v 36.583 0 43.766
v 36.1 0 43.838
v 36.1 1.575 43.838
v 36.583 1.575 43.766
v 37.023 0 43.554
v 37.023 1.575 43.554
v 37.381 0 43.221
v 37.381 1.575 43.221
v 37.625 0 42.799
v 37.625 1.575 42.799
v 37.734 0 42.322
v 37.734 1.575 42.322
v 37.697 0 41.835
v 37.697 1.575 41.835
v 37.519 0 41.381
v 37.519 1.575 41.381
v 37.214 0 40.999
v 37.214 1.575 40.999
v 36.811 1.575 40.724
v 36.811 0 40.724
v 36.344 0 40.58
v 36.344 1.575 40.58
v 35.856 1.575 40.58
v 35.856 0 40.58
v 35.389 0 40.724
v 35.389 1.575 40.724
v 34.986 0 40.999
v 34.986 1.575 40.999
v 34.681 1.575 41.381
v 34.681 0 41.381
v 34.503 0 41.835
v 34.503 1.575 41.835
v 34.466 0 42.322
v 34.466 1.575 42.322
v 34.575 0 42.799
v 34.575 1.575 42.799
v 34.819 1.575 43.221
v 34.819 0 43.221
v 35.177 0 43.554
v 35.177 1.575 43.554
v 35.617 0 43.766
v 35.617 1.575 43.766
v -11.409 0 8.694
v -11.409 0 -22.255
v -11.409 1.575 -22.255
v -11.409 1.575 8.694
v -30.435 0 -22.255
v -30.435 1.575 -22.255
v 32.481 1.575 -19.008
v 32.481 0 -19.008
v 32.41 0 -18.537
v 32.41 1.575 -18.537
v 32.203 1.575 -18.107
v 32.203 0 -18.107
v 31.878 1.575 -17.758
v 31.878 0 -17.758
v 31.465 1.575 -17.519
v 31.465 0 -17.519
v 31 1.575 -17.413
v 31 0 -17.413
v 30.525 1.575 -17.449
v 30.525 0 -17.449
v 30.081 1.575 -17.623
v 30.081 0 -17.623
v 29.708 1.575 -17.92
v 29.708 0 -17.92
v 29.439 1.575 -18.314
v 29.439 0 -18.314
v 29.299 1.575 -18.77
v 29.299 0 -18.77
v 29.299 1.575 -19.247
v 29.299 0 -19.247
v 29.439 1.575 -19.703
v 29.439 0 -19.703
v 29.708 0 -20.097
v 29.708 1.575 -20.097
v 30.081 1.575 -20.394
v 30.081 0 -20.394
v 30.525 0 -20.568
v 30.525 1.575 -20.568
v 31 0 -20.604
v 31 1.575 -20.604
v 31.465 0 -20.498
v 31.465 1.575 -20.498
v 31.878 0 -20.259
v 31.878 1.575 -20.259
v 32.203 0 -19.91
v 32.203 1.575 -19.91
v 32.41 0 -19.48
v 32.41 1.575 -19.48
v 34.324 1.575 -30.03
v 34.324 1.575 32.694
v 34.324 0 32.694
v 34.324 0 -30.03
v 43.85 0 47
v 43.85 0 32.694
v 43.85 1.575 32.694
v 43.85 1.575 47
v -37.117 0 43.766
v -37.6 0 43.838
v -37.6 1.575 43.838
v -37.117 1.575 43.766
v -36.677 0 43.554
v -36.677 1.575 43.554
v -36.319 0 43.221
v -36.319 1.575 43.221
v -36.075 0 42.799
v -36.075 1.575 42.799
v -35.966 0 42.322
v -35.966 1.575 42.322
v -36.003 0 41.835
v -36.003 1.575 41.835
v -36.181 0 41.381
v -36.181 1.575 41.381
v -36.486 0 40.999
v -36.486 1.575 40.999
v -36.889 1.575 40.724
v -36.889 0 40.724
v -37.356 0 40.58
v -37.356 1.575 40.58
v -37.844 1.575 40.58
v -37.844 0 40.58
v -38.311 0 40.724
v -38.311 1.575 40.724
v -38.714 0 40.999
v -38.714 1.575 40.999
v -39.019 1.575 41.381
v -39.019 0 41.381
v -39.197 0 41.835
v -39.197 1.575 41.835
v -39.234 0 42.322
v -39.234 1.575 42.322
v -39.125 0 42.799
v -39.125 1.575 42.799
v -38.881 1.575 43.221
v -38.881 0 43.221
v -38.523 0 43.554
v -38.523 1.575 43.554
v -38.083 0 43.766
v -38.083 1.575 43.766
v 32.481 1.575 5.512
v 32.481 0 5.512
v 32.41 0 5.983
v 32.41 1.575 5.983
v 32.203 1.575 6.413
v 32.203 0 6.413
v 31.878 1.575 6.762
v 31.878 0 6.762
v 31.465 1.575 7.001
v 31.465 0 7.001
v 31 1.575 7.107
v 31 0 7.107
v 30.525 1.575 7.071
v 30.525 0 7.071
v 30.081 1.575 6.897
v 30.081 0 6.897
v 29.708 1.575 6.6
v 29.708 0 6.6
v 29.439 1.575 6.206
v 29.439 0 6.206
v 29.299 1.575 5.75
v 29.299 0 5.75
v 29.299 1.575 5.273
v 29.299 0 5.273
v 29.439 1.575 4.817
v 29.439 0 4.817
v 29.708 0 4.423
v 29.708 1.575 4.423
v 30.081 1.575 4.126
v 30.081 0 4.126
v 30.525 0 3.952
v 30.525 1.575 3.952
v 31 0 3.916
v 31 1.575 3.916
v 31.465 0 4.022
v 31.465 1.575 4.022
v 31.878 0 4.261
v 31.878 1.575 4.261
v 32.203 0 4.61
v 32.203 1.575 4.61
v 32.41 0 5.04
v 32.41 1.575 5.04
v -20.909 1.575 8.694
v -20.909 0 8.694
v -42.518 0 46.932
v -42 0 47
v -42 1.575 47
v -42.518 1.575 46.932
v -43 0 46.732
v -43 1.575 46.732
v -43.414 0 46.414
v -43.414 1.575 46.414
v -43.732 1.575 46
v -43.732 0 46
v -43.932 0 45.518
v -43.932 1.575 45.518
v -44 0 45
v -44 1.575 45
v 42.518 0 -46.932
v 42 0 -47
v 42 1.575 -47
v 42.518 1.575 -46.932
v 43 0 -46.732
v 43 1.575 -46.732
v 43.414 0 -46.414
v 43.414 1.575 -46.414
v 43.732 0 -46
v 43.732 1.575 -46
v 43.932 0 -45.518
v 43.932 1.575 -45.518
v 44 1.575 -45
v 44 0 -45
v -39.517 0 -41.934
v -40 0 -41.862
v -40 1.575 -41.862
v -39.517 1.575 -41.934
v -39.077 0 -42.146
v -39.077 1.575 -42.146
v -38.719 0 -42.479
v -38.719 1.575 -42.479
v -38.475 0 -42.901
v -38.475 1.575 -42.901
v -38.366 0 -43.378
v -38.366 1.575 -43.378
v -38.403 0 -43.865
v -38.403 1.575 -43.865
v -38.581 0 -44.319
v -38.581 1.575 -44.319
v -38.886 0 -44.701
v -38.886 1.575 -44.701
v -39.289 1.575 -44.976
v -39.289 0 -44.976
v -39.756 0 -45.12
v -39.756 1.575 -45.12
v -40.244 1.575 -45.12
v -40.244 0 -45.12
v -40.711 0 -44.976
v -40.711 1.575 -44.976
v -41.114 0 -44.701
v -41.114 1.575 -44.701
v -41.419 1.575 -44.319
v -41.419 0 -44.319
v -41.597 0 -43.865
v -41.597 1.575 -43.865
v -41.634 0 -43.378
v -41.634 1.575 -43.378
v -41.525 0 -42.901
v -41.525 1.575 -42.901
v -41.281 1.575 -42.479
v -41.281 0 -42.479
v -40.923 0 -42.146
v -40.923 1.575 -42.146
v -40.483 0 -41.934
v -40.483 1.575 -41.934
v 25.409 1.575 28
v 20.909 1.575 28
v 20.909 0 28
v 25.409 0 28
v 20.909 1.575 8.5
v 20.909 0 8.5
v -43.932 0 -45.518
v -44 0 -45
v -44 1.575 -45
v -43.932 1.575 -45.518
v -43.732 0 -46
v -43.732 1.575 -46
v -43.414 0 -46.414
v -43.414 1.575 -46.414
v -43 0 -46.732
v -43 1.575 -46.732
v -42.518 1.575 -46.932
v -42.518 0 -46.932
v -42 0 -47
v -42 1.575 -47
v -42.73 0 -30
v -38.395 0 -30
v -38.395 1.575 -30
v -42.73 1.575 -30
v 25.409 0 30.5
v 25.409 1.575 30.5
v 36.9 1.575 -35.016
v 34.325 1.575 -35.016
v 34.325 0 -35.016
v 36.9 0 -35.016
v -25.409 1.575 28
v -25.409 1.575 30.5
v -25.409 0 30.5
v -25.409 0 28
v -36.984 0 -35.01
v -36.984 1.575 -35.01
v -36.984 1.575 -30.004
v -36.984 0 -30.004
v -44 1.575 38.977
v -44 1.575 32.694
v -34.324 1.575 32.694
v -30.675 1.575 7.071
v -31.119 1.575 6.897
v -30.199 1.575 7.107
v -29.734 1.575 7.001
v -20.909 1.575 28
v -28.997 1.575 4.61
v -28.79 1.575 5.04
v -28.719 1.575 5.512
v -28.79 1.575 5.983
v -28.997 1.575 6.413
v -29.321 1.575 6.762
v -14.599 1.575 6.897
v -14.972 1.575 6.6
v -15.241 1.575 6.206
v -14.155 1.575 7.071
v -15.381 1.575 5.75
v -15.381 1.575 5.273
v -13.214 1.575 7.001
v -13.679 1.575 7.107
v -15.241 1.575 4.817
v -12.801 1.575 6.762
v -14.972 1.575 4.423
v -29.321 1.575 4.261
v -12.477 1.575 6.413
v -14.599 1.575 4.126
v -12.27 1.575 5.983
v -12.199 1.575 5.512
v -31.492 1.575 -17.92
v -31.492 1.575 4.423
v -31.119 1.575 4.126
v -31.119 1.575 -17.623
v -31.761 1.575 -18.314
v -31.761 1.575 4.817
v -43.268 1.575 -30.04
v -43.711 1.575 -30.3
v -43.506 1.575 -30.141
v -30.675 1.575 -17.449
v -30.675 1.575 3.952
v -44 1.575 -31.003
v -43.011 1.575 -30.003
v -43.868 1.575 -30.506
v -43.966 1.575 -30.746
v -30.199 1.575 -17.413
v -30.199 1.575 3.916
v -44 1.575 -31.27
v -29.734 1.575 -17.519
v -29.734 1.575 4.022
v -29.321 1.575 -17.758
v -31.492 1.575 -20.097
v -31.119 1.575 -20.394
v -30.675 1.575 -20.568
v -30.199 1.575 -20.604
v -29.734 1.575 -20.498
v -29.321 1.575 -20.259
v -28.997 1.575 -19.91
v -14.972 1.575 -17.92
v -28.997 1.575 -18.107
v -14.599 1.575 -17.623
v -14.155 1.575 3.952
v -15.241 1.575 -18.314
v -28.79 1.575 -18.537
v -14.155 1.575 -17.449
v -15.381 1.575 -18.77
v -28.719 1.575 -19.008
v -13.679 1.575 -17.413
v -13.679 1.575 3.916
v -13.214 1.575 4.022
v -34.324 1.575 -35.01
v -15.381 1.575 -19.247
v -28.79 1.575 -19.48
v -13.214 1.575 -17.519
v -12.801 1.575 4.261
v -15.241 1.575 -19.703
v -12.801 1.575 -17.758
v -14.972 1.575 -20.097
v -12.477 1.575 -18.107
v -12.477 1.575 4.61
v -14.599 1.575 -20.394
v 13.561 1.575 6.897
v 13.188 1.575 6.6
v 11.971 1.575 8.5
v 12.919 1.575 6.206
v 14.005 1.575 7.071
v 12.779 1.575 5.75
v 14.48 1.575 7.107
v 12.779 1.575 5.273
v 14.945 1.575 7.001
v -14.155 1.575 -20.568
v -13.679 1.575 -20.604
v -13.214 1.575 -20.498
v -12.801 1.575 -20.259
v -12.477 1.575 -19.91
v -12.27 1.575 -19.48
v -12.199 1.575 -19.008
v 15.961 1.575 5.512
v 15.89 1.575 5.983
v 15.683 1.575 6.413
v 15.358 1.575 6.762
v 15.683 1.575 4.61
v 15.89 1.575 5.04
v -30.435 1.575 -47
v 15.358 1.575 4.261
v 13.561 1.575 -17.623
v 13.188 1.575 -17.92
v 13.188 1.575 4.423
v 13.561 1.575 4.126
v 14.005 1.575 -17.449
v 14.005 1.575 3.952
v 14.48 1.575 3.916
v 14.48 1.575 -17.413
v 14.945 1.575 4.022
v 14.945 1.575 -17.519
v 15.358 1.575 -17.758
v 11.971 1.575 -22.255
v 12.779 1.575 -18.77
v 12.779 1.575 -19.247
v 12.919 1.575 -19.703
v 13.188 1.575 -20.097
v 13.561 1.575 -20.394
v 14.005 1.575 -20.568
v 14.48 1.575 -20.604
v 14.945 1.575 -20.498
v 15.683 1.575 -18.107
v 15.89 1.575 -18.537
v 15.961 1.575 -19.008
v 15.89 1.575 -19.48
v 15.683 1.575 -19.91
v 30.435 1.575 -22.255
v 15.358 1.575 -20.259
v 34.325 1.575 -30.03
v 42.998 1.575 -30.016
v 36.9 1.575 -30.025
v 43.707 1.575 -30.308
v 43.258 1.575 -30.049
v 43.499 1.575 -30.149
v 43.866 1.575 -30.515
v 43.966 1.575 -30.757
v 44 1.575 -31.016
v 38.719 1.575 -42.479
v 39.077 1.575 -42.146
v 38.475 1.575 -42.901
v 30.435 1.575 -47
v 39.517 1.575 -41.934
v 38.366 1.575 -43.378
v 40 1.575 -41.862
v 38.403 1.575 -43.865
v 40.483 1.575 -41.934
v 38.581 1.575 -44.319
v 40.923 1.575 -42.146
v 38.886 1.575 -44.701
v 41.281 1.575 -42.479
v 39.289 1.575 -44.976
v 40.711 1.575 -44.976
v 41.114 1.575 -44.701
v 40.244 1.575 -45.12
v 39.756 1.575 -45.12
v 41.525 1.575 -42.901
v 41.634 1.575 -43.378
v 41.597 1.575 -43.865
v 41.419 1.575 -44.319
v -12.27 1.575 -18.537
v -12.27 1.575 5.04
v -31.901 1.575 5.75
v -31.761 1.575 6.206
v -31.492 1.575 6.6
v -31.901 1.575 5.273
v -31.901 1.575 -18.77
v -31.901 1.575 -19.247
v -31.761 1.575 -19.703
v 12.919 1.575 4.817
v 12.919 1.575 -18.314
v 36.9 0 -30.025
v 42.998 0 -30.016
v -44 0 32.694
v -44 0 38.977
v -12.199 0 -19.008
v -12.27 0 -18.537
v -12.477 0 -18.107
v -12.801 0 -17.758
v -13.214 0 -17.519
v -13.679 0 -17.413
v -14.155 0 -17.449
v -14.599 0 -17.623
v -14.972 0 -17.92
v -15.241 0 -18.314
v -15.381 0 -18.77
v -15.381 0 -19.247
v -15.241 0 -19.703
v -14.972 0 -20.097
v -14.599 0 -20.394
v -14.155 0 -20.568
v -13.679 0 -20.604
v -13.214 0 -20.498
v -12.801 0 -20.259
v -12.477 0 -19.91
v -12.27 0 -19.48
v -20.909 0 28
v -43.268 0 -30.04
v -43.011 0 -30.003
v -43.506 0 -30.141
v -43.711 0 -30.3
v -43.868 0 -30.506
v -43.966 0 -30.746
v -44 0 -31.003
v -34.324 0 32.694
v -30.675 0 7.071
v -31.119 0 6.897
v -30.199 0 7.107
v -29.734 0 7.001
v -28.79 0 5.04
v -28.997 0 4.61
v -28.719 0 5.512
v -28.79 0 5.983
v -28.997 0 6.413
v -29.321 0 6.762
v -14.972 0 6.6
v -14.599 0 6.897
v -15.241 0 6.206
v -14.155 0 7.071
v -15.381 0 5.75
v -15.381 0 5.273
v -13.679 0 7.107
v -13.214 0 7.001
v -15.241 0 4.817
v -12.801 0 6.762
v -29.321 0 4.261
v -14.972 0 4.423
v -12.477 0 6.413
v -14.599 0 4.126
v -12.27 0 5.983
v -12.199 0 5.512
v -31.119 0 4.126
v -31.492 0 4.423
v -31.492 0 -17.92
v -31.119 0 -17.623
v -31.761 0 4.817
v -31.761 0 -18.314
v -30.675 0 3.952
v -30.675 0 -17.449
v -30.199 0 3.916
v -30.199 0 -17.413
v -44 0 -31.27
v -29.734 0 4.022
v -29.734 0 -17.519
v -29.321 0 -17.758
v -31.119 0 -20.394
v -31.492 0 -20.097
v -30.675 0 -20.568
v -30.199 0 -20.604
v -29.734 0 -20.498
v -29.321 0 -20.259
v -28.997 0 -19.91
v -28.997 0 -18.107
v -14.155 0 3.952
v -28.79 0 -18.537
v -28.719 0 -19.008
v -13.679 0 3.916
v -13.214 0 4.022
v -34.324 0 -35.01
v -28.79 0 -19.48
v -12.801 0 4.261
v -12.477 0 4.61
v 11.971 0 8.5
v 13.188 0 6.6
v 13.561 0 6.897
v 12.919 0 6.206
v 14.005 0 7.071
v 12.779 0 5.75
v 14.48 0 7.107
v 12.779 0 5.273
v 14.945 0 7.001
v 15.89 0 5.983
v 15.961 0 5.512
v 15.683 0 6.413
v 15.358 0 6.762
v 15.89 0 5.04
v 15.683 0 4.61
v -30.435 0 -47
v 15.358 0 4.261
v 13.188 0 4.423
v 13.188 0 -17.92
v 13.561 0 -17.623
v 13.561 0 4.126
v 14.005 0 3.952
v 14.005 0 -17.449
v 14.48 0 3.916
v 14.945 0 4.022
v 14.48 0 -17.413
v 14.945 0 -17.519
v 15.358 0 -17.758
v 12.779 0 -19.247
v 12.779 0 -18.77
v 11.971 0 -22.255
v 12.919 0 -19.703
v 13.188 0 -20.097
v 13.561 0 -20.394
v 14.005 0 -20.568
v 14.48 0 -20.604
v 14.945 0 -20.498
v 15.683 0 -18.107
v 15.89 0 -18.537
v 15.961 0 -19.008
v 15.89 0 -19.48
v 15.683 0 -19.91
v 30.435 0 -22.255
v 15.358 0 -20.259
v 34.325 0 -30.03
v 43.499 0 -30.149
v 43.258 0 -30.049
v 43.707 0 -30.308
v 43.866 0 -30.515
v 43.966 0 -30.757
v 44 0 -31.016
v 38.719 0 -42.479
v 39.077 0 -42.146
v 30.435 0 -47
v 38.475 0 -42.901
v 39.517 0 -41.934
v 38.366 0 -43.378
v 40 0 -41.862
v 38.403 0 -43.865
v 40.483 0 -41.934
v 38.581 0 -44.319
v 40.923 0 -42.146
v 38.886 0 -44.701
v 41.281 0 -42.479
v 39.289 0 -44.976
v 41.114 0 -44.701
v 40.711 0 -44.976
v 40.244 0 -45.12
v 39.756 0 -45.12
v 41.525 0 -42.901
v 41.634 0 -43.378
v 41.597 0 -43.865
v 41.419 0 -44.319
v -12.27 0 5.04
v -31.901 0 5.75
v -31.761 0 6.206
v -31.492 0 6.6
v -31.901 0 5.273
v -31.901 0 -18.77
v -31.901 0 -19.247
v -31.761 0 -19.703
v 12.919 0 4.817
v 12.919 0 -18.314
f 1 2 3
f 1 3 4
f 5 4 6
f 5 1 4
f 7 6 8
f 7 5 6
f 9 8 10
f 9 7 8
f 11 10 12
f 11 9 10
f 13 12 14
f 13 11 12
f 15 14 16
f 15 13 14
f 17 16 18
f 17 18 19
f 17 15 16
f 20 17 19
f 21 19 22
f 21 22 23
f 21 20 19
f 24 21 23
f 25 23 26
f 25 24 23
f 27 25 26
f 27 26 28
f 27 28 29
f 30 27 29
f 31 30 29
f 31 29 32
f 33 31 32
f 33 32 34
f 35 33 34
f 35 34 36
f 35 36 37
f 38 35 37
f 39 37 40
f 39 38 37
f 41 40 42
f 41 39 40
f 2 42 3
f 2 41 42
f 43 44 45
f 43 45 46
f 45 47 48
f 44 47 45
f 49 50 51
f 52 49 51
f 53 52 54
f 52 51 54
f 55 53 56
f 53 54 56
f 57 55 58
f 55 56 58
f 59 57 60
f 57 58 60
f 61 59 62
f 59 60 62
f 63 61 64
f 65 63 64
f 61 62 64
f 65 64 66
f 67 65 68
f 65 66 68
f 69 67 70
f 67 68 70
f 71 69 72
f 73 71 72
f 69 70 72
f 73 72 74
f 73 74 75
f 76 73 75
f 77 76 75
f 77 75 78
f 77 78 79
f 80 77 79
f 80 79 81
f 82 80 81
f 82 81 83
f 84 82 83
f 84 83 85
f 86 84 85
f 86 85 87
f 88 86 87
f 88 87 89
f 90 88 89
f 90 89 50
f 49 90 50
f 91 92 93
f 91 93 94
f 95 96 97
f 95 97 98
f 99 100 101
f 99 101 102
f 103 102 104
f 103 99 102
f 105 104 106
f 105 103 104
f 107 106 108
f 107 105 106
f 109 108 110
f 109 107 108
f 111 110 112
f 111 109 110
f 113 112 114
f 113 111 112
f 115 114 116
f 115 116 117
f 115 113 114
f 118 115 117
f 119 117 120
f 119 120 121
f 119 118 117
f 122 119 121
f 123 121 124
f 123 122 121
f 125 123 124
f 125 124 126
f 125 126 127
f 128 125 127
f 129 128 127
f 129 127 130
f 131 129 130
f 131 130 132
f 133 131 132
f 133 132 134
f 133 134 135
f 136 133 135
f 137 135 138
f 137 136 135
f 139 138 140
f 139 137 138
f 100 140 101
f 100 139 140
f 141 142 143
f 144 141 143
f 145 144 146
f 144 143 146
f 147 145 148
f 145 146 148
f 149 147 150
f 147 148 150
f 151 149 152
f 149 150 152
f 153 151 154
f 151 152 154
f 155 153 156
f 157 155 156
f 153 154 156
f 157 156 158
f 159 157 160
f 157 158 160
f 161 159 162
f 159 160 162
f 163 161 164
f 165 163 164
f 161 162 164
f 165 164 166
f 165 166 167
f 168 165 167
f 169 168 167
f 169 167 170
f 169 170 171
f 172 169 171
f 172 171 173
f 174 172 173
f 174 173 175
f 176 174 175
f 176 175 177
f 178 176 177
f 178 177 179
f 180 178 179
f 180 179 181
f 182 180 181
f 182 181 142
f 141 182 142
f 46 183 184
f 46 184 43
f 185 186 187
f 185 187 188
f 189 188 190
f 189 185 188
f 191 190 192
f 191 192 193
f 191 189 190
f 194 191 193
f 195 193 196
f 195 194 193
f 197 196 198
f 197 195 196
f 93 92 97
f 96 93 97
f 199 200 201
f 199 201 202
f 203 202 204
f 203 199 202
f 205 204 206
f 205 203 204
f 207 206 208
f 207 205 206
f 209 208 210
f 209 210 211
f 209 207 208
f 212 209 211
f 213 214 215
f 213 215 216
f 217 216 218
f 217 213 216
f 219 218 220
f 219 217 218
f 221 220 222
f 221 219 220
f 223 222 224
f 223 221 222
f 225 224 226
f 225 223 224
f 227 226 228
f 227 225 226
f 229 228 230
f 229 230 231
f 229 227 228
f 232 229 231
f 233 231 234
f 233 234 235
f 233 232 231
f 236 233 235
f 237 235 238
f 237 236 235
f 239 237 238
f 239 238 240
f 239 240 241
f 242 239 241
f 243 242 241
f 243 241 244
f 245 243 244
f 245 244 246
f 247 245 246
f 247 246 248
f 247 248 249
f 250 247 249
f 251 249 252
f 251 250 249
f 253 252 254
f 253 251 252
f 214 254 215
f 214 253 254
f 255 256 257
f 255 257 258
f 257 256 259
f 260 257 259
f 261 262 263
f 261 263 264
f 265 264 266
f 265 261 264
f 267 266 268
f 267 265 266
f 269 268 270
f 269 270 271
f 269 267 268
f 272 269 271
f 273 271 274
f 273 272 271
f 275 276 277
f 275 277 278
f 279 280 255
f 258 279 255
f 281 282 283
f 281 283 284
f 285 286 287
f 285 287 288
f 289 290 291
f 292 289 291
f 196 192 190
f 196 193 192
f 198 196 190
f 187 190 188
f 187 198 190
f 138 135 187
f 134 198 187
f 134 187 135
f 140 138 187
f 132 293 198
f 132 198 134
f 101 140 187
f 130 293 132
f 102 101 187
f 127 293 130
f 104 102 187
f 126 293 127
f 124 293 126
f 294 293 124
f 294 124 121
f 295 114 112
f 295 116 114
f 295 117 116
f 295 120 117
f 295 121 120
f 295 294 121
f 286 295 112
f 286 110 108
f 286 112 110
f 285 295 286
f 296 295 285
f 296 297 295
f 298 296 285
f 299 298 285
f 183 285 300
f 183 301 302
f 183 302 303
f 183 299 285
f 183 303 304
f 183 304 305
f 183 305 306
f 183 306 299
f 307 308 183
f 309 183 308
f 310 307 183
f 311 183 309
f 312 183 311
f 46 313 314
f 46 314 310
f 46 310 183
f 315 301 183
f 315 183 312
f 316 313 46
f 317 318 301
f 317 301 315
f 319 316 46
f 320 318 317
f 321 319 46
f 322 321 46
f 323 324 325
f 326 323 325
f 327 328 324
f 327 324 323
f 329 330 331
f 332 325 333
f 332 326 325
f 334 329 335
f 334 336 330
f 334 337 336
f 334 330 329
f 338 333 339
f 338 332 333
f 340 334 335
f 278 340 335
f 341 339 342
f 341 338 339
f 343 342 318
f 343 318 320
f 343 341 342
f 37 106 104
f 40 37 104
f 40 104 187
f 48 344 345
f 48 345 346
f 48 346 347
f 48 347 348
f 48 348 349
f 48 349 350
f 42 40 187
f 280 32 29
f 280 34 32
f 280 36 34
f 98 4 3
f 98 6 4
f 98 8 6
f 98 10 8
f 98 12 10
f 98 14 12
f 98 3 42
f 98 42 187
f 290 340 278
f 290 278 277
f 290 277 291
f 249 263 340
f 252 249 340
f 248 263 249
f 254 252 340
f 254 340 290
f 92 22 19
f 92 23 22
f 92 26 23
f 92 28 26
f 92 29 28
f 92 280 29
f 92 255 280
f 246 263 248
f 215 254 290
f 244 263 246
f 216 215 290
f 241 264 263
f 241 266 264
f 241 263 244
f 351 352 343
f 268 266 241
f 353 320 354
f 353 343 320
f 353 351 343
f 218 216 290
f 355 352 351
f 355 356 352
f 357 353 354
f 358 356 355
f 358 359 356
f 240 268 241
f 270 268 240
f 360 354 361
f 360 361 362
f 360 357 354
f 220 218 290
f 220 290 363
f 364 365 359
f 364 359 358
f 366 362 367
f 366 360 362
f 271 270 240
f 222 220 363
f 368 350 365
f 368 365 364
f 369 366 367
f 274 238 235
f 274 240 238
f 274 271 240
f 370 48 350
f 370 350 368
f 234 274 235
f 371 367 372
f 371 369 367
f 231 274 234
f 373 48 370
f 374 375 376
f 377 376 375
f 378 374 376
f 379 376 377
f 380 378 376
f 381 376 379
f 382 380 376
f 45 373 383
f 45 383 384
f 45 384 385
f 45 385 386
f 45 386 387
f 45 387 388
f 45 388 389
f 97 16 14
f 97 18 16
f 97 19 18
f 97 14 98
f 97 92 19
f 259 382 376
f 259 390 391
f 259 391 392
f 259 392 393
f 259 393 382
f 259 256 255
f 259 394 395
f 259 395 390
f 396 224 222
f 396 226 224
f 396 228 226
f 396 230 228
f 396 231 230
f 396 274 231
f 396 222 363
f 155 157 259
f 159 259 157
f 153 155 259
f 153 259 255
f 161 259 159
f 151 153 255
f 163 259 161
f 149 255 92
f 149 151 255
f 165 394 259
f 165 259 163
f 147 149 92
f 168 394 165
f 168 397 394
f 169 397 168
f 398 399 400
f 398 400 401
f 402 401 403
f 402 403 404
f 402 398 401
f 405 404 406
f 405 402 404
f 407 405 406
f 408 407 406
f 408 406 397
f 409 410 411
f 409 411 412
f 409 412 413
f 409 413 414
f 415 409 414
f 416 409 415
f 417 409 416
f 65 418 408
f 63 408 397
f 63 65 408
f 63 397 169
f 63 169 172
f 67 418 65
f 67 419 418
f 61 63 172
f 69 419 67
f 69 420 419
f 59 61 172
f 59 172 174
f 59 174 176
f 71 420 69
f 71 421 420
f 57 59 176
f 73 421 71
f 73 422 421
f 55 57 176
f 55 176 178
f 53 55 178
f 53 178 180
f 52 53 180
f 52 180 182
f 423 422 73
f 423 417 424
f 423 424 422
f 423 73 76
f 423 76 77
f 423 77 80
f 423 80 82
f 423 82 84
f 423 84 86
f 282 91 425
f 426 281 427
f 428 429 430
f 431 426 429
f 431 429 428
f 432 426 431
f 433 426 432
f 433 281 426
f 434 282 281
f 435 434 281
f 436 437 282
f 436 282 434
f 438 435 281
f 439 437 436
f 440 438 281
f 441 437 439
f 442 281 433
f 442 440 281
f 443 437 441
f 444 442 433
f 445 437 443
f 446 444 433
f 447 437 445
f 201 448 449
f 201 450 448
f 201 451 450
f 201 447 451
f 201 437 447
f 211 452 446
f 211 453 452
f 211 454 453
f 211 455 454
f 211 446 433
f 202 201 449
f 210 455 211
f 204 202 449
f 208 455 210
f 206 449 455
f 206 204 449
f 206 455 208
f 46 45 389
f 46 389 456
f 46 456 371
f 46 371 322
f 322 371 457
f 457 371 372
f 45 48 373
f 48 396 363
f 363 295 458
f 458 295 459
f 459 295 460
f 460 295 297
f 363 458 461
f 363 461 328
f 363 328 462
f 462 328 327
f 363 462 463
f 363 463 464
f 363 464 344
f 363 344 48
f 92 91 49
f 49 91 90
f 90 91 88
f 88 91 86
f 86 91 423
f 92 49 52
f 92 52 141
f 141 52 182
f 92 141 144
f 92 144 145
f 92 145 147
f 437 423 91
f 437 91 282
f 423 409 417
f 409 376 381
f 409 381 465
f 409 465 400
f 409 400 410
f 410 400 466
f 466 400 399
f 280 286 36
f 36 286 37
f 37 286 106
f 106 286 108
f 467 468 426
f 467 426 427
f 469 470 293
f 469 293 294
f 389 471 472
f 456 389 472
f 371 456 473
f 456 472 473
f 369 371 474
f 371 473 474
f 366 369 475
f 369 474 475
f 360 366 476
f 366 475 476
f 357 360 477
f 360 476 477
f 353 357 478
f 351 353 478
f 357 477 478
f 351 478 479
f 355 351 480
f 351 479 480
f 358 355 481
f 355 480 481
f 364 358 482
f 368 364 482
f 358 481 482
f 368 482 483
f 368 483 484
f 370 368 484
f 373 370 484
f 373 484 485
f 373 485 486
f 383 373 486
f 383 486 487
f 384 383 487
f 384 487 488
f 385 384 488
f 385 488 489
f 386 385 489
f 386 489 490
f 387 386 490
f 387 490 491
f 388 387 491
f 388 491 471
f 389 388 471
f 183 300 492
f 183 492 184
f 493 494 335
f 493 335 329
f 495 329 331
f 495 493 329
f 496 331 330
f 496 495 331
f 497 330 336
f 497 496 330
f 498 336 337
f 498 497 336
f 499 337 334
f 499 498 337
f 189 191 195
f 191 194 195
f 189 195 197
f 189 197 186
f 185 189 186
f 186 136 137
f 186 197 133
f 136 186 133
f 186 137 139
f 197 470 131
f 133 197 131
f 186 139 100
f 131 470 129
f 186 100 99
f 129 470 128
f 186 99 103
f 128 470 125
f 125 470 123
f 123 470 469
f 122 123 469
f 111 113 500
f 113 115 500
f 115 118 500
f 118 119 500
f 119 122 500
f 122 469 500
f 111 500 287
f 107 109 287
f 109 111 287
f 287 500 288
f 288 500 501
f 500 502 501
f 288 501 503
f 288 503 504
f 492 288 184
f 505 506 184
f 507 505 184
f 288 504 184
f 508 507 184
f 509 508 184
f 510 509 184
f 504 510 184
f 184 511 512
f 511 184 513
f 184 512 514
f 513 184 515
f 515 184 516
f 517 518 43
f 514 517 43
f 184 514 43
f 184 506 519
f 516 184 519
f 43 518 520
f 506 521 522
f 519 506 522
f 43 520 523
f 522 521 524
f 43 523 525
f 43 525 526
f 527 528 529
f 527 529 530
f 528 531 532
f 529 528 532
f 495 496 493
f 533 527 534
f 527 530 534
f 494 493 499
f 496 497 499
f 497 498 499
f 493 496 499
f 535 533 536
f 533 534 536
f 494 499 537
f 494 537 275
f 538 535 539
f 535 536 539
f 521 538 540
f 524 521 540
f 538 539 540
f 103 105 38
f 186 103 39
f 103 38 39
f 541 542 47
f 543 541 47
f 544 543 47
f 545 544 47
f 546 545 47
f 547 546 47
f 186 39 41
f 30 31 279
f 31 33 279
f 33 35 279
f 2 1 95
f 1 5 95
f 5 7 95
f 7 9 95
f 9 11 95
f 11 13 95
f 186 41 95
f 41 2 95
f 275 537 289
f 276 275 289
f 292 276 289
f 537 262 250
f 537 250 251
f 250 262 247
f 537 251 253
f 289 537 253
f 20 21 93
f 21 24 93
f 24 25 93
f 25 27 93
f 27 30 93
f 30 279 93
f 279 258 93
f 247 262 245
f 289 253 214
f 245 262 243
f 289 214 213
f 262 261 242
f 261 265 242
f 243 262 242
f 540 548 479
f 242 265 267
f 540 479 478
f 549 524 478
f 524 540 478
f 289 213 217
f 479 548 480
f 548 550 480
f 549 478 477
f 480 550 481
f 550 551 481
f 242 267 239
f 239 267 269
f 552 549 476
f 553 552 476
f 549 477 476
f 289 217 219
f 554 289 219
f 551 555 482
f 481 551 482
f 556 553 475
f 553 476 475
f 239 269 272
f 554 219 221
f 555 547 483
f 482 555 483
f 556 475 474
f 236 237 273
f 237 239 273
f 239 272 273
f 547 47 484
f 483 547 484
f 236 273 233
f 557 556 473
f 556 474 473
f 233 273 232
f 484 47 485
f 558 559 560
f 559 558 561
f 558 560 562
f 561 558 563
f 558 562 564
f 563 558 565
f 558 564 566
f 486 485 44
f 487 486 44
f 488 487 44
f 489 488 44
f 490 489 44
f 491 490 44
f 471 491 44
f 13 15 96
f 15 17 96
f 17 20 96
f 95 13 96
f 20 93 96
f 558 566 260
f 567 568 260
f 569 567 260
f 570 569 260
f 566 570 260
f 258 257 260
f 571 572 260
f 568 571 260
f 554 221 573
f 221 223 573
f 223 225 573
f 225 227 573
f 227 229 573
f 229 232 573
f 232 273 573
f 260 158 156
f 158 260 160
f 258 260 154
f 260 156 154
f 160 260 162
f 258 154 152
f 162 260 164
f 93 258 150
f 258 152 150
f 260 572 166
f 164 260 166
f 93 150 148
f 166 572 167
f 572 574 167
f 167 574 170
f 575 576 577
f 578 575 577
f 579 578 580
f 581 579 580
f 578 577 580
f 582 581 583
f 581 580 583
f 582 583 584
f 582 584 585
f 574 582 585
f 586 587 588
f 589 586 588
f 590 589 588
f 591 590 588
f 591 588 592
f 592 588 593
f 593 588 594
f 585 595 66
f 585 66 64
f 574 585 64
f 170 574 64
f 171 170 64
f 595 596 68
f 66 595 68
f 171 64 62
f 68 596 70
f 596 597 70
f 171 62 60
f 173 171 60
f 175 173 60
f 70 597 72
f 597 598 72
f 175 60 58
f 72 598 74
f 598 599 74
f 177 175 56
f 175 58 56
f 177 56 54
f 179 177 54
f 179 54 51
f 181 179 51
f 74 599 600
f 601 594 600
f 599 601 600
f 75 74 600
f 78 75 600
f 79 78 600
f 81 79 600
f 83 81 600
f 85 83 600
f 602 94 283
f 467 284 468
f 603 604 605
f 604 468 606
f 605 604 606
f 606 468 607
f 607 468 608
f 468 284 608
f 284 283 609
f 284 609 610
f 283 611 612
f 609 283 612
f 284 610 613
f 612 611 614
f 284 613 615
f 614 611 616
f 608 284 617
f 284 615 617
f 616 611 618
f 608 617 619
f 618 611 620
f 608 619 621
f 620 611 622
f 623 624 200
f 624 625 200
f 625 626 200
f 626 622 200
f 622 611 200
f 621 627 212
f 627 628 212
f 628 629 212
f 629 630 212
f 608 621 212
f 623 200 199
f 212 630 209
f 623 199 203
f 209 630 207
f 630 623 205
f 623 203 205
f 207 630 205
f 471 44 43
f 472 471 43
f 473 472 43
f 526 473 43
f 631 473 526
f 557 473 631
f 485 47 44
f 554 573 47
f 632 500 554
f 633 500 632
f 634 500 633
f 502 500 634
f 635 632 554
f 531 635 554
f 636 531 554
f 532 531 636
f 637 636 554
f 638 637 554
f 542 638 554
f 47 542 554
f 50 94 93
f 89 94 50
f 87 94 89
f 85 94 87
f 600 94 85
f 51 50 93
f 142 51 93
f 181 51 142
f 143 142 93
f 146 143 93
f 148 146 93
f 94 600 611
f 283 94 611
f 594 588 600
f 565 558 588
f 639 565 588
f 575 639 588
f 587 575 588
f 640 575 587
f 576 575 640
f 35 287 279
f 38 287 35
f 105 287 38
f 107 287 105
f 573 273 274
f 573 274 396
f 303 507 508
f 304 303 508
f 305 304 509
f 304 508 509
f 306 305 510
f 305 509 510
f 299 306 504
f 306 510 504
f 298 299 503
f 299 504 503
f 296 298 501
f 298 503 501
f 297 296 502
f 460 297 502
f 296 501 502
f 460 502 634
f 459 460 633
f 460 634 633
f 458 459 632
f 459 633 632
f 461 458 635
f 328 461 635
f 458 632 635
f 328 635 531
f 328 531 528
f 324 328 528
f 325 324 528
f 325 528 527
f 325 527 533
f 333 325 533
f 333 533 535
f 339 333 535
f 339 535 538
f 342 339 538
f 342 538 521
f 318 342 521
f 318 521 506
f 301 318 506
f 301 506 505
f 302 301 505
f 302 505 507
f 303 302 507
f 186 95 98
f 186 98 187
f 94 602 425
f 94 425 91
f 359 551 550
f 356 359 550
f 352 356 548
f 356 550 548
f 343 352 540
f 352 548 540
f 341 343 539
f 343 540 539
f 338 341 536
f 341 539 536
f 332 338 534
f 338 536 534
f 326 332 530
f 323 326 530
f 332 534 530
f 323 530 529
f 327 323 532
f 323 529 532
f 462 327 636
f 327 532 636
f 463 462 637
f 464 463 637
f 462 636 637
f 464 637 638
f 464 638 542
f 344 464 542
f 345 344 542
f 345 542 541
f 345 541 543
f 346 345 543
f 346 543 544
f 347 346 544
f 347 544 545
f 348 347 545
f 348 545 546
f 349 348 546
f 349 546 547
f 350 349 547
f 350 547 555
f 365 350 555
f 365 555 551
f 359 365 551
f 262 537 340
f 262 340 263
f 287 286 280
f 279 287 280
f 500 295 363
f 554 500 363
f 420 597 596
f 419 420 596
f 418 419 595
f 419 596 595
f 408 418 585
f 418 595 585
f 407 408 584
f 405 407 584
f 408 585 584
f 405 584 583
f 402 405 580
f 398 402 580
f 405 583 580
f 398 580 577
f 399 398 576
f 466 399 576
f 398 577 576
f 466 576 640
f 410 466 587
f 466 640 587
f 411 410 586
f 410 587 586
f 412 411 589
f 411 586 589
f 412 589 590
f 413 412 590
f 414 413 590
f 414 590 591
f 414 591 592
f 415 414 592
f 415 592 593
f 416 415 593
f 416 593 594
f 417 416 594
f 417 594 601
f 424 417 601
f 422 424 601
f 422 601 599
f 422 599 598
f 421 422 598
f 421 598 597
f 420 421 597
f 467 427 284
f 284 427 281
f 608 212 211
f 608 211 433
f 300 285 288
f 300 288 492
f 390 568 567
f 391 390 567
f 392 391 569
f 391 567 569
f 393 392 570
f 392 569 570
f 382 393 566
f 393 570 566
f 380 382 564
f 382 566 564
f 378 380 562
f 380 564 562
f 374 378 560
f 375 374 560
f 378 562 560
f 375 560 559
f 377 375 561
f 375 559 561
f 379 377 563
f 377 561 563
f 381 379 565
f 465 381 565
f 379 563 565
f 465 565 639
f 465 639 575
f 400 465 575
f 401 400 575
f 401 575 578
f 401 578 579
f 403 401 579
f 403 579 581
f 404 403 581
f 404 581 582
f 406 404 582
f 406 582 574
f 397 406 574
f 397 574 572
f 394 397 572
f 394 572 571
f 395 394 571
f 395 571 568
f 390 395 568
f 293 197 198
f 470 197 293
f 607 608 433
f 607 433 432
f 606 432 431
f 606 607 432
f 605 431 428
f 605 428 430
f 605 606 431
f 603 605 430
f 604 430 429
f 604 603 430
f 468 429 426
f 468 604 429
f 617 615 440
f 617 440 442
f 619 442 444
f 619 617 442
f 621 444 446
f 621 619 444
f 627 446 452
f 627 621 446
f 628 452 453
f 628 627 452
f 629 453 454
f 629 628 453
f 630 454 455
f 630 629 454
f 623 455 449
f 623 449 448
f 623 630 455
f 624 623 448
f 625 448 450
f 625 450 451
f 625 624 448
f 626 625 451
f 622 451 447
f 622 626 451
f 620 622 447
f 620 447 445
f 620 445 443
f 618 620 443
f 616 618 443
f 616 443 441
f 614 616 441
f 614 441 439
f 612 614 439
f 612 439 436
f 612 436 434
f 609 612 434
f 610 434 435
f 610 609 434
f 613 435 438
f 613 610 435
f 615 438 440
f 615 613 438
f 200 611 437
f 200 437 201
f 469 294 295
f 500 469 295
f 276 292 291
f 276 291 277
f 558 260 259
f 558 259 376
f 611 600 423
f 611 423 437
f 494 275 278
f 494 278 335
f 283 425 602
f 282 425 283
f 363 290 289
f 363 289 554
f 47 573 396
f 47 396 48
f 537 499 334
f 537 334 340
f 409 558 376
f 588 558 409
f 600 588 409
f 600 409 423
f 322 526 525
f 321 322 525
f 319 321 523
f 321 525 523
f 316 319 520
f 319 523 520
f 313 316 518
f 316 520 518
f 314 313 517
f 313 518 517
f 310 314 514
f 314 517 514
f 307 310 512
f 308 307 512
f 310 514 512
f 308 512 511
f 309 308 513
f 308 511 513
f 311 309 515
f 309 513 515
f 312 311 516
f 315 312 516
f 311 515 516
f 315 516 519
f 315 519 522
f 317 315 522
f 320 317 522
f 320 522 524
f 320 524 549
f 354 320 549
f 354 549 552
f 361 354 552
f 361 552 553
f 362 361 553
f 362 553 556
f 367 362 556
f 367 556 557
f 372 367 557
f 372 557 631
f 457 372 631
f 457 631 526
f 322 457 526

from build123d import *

# Parameters (mm, degrees)
SKETCH1_2_R                 = 1.6383
BOSS_EXTRUDE2_DEPTH         = 1.575
SKETCH2_W                   = 14.080651801
SKETCH2_H                   = 7.11628052
SKETCH2_W_2                 = 15.007196354
SKETCH2_H_2                 = 9.421332762
CUT_EXTRUDE1_DEPTH          = 65.400942629
ADDITIONAL_PCB_MATERIAL_W   = 2.649520344
ADDITIONAL_PCB_MATERIAL_H   = 65.213315835
ADDITIONAL_PCB_MATERIAL_W_2 = 1.5
ADDITIONAL_PCB_MATERIAL_H_2 = 65.299191064
BOSS_EXTRUDE3_DEPTH         = 1.575
SKETCH3_W                   = 46.818
SKETCH3_H                   = 1
BOSS_EXTRUDE4_DEPTH         = 1.575
SKETCH4_W                   = 2
SKETCH4_H                   = 2.5
CUT_EXTRUDE2_DEPTH          = 65.400942629
SKETCH5_W                   = 2.5
SKETCH5_H                   = 18.09999695
SKETCH5_H_2                 = 19.499999394
BOSS_EXTRUDE5_DEPTH         = 1.575
SKETCH7_W                   = 9.5
SKETCH7_H                   = 1.20600305
CUT_EXTRUDE3_DEPTH          = 65.400942629
M3_CLEARANCE_HOLE1_D        = 3.2
M3_CLEARANCE_HOLE2_D        = 3.2
M3_CLEARANCE_HOLE3_D        = 3.2
M3_CLEARANCE_HOLE4_D        = 3.2
M3_CLEARANCE_HOLE5_D        = 3.2
SKETCH26_W                  = 2.575
SKETCH26_H                  = 5
CUT_EXTRUDE4_DEPTH          = 10


with BuildPart() as part:
    # Sketch1<2> → Boss-Extrude2 (new body)
    with BuildSketch(Plane(origin=(0, 0, 0), x_dir=(1, 0, 0), z_dir=(0, 1, 0))):
        with BuildLine():
            Line((-38.39500299, 29.999999735), (-42.73000299, 29.999999735))
            Line((-42.73000299, 29.999999735), (-43.011025994, 30.003097626))
            ThreePointArc((-43.011025994, 30.003097626), (-43.710996344, 30.299838092), (-44.000003042, 31.003036872))
            Line((-44.000003042, 31.003036872), (-44.000003042, 31.269999735))
            Line((-44.000003042, 31.269999735), (-44.000005679, 44.999999735))
            ThreePointArc((-44.000005679, 44.999999735), (-43.414218633, 46.414215608), (-42.000002924, 47.000003051))
            Line((-42.000002924, 47.000003051), (-30.435003, 47.000003051))
            Line((-30.435003, 47.000003051), (-30.435003, 22.255357341))
            Line((-30.435003, 22.255357341), (-11.409003, 22.255357341))
            Line((-11.409003, 22.255357341), (-11.409003, -9.899999999))
            Line((-11.409003, -9.899999999), (-23.409003, -9.899999999))
            Line((-23.409003, -9.899999999), (-23.409003, -31.499996949))
            Line((-23.409003, -31.499996949), (23.408997, -31.499996949))
            Line((23.408997, -31.499996949), (23.408997, -8.499997555))
            Line((23.408997, -8.499997555), (11.97084713, -8.499997555))
            Line((11.97084713, -8.499997555), (11.97084713, 22.255357341))
            Line((11.97084713, 22.255357341), (30.434997, 22.255357341))
            Line((30.434997, 22.255357341), (30.434997, 47.000003051))
            Line((30.434997, 47.000003051), (42.000008541, 47.000003051))
            ThreePointArc((42.000008541, 47.000003051), (43.414213215, 46.414220704), (43.999996956, 45.000016607))
            Line((43.999996956, 45.000016607), (43.999996956, 32.000003378))
            Line((43.999996956, 32.000003378), (43.999996956, 31.015615364))
            ThreePointArc((43.999996956, 31.015615364), (43.706534093, 30.307939396), (42.998386406, 30.015616661))
            Line((42.998386406, 30.015616661), (33.825607551, 30.030389905))
            ThreePointArc((33.825607551, 30.030389905), (33.117459864, 29.738067169), (32.823997, 29.030391202))
            Line((32.823997, 29.030391202), (32.823997, -30.453996949))
            ThreePointArc((32.823997, -30.453996949), (33.116890219, -31.16110373), (33.823997, -31.453996949))
            Line((33.823997, -31.453996949), (36.099999555, -31.453996949))
            Line((36.099999555, -31.453996949), (42.849728118, -31.453996949))
            ThreePointArc((42.849728118, -31.453996949), (43.556834899, -31.746890168), (43.849728118, -32.453996949))
            Line((43.849728118, -32.453996949), (43.849728118, -36.999996949))
            Line((43.849728118, -36.999996949), (43.849728118, -46.999996949))
            Line((43.849728118, -46.999996949), (-42.000000178, -46.999996949))
            ThreePointArc((-42.000000178, -46.999996949), (-43.414212804, -46.414211581), (-44.000000499, -44.999999921))
            Line((-44.000000499, -44.999999921), (-44.000000178, -38.976999921))
            Line((-44.000000178, -38.976999921), (-44.000000178, -32.453999802))
            ThreePointArc((-44.000000178, -32.453999802), (-43.70710696, -31.746893021), (-43.000000178, -31.453999802))
            Line((-43.000000178, -31.453999802), (-36.100000549, -31.453999802))
            Line((-36.100000549, -31.453999802), (-33.824003042, -31.453999802))
            ThreePointArc((-33.824003042, -31.453999802), (-33.116896261, -31.161106583), (-32.824003042, -30.453999802))
            Line((-32.824003042, -30.453999802), (-32.824003042, 29.011483943))
            ThreePointArc((-32.824003042, 29.011483943), (-33.117785331, 29.719478678), (-33.826516131, 30.011480785))
            Line((-33.826516131, 30.011480785), (-38.39500299, 29.999999735))
        make_face()
        with Locations((40, 43.5)):
            Circle(SKETCH1_2_R, mode=Mode.SUBTRACT)
        with Locations((-40, 43.5)):
            Circle(SKETCH1_2_R, mode=Mode.SUBTRACT)
        with Locations((-37.6, -42.2)):
            Circle(SKETCH1_2_R, mode=Mode.SUBTRACT)
        with Locations((36.1, -42.2)):
            Circle(SKETCH1_2_R, mode=Mode.SUBTRACT)
    extrude(amount=BOSS_EXTRUDE2_DEPTH)

    # Sketch2 → Cut-Extrude1 (cut, through all)
    with BuildSketch(Plane(origin=(0, 1.575, 0), x_dir=(1, 0, 0), z_dir=(0, 1, 0))):
        with Locations((39.863054019, -29.135856689)):
            Rectangle(SKETCH2_W, SKETCH2_H)
        with Locations((-40.336598676, -27.983330568)):
            Rectangle(SKETCH2_W_2, SKETCH2_H_2)
    extrude(amount=-CUT_EXTRUDE1_DEPTH, mode=Mode.SUBTRACT)

    # Additional PCB material → Boss-Extrude3 (add)
    with BuildSketch(Plane(origin=(0, 1.575, 0), x_dir=(1, 0, 0), z_dir=(0, 1, 0))):
        with Locations((32.999236828, -1.128517583)):
            Rectangle(ADDITIONAL_PCB_MATERIAL_W, ADDITIONAL_PCB_MATERIAL_H)
        with Locations((-33.574003042, -1.085579968)):
            Rectangle(ADDITIONAL_PCB_MATERIAL_W_2, ADDITIONAL_PCB_MATERIAL_H_2)
    extrude(amount=-BOSS_EXTRUDE3_DEPTH)

    # Sketch3 → Boss-Extrude4 (add)
    with BuildSketch(Plane(origin=(0, 1.575, 0), x_dir=(1, 0, 0), z_dir=(0, 1, 0))):
        with Locations((-3e-06, -30.999996949)):
            Rectangle(SKETCH3_W, SKETCH3_H)
    extrude(amount=-BOSS_EXTRUDE4_DEPTH)

    # Sketch4 → Cut-Extrude2 (cut, through all)
    with BuildSketch(Plane(origin=(0, 1.575, 0), x_dir=(1, 0, 0), z_dir=(0, 1, 0))):
        with Locations((24.408997, -29.249996949)):
            Rectangle(SKETCH4_W, SKETCH4_H)
        with Locations((-24.409003, -29.249996949)):
            Rectangle(SKETCH4_W, SKETCH4_H)
    extrude(amount=-CUT_EXTRUDE2_DEPTH, mode=Mode.SUBTRACT)

    # Sketch5 → Boss-Extrude5 (add)
    with BuildSketch(Plane(origin=(0, 1.575, 0), x_dir=(1, 0, 0), z_dir=(0, 1, 0))):
        with Locations((-22.159003, -18.949998474)):
            Rectangle(SKETCH5_W, SKETCH5_H)
        with Locations((22.158997, -18.249997252)):
            Rectangle(SKETCH5_W, SKETCH5_H_2)
    extrude(amount=-BOSS_EXTRUDE5_DEPTH)

    # Sketch7 → Cut-Extrude3 (cut, through all)
    with BuildSketch(Plane(origin=(0, 1.575, 0), x_dir=(1, 0, 0), z_dir=(0, 1, 0))):
        with Locations((-16.159003, -9.296998474)):
            Rectangle(SKETCH7_W, SKETCH7_H)
    extrude(amount=-CUT_EXTRUDE3_DEPTH, mode=Mode.SUBTRACT)

    # M3 Clearance Hole1 (through all)
    with Locations(Plane(origin=(-37.357724691, 1.575, 48.235847646), x_dir=(-1, 0, 0), z_dir=(0, 1, 0))):
        with Locations((-23.558721691, -42.724316051), (-23.558721691, -67.244316051), (-7.038721691, -67.244316051), (-7.038721691, -42.724316051)):
            Hole(M3_CLEARANCE_HOLE1_D / 2)

    # M3 Clearance Hole2 (through all)
    with Locations(Plane(origin=(-37.357724691, 1.575, 48.235847646), x_dir=(-1, 0, 0), z_dir=(0, 1, 0))):
        with Locations((-51.71857182, -42.724316051)):
            Hole(M3_CLEARANCE_HOLE2_D / 2)

    # M3 Clearance Hole3 (through all)
    with Locations(Plane(origin=(-37.357724691, 1.575, 48.235847646), x_dir=(-1, 0, 0), z_dir=(0, 1, 0))):
        with Locations((-68.23857182, -42.724316051)):
            Hole(M3_CLEARANCE_HOLE3_D / 2)

    # M3 Clearance Hole4 (through all)
    with Locations(Plane(origin=(-37.357724691, 21.15, 48.235847646), x_dir=(-1, 0, 0), z_dir=(0, 1, 0))):
        with Locations((-51.71857182, -67.244316051)):
            Hole(M3_CLEARANCE_HOLE4_D / 2)

    # M3 Clearance Hole5 (through all)
    with Locations(Plane(origin=(-37.357724691, 1.575, 48.235847646), x_dir=(-1, 0, 0), z_dir=(0, 1, 0))):
        with Locations((-68.23857182, -67.244316051)):
            Hole(M3_CLEARANCE_HOLE5_D / 2)

    # Sketch26 → Cut-Extrude4 (cut)
    with BuildSketch(Plane(origin=(0, 1.575, 0), x_dir=(1, 0, 0), z_dir=(0, 1, 0))):
        Polygon((-36.984003042, 35.010230552), (-34.324003042, 35.010230552), (-34.324003042, 29.927765717), (-36.984003042, 29.927765717), (-36.984003042, 30.010230552), align=None)
        with Locations((35.612496956, 32.515616661)):
            Rectangle(SKETCH26_W, SKETCH26_H)
    extrude(amount=-CUT_EXTRUDE4_DEPTH, mode=Mode.SUBTRACT)


solid = part.part
